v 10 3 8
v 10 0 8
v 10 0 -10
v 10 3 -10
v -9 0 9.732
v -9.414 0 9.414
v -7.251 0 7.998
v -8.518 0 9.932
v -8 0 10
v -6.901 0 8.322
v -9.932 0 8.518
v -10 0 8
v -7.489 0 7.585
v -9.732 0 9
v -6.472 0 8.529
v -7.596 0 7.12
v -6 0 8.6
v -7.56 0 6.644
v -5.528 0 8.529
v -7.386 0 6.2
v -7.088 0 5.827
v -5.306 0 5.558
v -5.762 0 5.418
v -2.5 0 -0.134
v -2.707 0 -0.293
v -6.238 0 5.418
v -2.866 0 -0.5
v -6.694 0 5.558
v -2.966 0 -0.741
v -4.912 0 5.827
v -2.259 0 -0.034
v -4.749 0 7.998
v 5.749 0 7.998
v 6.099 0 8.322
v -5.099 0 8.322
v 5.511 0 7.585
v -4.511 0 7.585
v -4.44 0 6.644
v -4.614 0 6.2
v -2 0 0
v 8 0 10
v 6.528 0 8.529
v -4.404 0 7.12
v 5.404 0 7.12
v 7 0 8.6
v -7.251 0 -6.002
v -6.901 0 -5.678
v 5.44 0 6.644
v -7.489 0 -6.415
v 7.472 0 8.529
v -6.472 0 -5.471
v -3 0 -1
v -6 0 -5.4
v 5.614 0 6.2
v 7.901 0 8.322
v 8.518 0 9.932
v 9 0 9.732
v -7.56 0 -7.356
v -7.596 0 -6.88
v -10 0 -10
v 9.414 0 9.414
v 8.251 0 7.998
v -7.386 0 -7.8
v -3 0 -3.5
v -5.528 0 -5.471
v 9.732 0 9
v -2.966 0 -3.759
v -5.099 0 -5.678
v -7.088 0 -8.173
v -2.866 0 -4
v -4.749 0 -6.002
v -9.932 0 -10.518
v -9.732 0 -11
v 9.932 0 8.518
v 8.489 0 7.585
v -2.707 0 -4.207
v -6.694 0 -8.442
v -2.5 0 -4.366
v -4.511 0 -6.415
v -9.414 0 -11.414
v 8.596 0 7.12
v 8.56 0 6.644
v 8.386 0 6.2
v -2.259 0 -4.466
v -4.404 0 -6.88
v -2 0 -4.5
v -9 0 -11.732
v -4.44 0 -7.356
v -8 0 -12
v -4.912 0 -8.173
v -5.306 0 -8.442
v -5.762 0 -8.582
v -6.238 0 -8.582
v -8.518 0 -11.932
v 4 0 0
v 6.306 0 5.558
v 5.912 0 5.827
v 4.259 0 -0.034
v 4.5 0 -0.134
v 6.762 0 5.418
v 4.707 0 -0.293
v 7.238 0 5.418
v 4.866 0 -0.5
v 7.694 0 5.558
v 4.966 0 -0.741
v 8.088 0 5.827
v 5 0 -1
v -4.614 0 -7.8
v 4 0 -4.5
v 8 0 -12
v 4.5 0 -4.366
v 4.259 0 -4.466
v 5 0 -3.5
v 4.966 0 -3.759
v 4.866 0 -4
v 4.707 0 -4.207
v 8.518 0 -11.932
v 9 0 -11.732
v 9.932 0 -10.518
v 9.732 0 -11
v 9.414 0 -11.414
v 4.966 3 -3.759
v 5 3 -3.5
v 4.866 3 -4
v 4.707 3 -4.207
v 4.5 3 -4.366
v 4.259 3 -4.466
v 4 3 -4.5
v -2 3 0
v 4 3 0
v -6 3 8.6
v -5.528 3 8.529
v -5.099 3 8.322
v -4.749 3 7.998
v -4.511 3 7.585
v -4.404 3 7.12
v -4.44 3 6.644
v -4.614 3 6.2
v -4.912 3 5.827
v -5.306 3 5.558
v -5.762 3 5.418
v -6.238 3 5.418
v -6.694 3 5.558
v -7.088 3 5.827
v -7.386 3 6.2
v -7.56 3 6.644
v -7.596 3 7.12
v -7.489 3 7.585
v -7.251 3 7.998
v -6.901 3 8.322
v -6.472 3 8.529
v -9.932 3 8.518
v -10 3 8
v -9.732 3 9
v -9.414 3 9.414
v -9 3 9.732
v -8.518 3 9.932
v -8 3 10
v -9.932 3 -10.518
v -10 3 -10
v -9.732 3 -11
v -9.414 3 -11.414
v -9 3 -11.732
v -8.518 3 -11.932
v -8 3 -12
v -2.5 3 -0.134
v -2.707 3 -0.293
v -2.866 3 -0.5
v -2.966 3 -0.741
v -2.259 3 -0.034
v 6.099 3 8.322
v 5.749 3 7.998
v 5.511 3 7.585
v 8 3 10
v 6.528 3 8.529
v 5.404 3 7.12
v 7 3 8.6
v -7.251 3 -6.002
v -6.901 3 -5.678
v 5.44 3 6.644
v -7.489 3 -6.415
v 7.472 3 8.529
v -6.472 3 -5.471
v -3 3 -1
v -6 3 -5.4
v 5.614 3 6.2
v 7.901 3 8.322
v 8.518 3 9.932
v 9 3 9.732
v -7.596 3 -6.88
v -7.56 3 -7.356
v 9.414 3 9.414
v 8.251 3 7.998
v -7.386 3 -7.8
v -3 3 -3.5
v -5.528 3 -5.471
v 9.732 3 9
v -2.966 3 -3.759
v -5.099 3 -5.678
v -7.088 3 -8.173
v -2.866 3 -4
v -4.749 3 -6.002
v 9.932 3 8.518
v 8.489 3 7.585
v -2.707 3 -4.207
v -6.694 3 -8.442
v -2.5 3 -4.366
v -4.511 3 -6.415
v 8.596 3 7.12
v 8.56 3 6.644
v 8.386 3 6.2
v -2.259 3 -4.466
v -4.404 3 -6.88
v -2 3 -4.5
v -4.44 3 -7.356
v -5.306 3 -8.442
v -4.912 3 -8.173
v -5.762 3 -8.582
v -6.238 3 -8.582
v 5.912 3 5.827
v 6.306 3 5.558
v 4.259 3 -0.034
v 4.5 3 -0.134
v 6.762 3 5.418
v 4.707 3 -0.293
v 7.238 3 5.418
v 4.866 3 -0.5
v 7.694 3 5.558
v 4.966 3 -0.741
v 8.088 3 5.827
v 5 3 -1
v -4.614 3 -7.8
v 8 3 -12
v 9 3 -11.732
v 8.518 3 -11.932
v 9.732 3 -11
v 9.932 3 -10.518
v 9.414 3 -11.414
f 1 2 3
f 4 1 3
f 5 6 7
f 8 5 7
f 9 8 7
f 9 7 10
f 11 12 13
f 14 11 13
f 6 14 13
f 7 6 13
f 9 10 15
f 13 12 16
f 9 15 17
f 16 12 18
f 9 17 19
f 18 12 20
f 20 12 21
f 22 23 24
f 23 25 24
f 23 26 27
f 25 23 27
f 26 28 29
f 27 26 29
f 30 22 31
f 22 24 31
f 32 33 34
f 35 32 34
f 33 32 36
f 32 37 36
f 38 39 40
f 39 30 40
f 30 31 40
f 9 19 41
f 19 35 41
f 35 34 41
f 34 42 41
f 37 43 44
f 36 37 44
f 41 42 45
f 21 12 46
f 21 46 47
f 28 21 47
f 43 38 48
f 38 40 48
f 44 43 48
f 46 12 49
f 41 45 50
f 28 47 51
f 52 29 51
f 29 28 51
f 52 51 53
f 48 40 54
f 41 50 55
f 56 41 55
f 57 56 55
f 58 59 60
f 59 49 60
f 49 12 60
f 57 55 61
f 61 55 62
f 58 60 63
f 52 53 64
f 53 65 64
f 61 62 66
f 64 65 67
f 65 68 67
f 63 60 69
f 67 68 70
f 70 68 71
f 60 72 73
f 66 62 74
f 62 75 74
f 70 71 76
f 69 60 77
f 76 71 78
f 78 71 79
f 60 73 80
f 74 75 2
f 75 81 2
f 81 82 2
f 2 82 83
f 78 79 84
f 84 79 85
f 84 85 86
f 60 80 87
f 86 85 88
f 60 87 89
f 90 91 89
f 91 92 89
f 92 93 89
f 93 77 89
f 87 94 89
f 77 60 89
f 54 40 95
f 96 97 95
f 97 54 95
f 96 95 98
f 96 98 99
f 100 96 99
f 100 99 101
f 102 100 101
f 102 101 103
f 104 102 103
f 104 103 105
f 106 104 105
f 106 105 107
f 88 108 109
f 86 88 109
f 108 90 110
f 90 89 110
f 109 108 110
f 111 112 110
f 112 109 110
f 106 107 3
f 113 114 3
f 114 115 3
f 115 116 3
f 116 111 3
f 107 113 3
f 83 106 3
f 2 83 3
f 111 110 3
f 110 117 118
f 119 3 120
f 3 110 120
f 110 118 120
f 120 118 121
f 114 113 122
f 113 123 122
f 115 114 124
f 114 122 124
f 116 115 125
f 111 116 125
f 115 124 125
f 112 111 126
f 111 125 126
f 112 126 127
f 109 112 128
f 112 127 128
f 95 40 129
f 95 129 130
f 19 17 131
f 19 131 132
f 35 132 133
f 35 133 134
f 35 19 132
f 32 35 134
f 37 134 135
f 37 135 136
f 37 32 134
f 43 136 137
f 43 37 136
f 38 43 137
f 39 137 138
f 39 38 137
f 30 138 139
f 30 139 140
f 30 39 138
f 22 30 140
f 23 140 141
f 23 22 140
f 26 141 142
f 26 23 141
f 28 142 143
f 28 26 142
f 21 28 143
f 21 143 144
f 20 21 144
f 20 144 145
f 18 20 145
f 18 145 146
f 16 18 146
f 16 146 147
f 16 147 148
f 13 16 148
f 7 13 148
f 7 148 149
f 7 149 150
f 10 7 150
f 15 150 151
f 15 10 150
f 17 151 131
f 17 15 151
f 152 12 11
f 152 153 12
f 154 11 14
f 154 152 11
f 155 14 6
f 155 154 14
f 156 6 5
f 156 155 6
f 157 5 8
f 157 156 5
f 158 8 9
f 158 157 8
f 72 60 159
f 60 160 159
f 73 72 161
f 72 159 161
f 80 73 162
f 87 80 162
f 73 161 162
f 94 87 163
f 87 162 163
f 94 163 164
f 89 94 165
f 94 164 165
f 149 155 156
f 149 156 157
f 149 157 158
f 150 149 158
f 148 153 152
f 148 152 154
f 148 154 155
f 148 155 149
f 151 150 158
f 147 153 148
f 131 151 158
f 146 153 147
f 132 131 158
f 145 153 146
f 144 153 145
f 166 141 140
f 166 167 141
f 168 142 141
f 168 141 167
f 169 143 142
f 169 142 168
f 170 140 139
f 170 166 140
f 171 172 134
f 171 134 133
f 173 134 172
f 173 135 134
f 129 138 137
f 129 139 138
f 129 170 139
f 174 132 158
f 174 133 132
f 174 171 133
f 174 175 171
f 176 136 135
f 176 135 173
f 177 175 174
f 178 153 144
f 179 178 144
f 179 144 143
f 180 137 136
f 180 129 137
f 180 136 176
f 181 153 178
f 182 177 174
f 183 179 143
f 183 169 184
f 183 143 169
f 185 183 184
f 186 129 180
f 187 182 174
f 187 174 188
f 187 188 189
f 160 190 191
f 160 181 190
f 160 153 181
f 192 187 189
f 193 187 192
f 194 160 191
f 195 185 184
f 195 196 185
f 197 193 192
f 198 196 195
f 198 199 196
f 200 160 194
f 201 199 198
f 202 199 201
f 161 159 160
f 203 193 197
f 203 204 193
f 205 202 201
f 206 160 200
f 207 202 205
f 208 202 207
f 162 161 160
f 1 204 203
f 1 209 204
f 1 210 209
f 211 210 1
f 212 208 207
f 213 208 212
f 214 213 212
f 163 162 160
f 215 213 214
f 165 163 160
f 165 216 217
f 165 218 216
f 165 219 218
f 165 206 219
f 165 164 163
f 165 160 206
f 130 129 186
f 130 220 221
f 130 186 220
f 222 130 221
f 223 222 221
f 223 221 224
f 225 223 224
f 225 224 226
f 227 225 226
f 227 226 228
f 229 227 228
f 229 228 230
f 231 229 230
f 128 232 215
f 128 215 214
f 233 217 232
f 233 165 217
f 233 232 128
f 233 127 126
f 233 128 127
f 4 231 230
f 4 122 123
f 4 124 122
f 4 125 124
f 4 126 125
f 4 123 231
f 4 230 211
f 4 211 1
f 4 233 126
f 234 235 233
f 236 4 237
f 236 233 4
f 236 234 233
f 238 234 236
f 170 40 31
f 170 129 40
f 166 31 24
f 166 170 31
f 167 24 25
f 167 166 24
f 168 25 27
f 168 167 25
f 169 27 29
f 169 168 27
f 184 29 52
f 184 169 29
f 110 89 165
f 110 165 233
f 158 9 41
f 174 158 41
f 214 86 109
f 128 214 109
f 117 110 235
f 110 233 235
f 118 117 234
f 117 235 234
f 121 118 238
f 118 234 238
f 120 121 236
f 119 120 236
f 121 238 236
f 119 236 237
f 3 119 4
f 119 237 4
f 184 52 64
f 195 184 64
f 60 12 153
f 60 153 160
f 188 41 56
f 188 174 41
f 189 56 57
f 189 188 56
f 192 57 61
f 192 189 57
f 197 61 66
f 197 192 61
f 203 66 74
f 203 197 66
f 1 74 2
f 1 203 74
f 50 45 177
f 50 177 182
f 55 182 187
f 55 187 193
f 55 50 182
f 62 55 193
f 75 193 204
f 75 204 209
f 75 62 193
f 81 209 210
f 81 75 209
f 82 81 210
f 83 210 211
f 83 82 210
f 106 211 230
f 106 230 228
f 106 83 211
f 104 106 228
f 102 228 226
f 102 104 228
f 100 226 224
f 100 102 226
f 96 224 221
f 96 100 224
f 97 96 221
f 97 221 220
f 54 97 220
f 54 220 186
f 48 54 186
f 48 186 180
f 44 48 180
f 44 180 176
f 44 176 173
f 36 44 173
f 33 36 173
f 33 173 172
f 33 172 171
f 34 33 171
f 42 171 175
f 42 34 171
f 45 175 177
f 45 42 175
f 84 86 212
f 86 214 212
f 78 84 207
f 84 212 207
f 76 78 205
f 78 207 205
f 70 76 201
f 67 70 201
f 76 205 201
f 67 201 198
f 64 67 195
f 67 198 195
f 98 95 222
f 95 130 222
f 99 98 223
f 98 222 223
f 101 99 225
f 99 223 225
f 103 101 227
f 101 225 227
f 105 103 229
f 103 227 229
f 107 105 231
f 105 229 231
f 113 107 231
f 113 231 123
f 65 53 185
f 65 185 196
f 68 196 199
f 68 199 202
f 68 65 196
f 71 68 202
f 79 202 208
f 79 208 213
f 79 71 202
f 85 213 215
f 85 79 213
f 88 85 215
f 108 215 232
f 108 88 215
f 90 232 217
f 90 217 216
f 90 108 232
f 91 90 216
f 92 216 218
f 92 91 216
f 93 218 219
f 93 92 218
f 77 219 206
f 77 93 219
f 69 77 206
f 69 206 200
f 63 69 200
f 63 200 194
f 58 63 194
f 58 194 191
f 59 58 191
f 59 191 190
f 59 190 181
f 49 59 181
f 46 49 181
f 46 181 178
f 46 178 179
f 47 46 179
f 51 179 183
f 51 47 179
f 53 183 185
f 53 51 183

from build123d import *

# Parameters (mm, degrees)
SKETCH_2_W      = 20
SKETCH_2_H      = 22
SKETCH_2_R      = 1.6
SKETCH_2_W_2    = 8
SKETCH_2_H_2    = 4.5
EXTRUDE_1_DEPTH = 3
FILLET_1_R      = 2
FILLET_2_R      = 1


with BuildPart() as part:
    # 草图2 → 凸台-拉伸1 (new body)
    with BuildSketch(Plane(origin=(0, 0, 0), x_dir=(1, 0, 0), z_dir=(0, 1, 0))):
        with Locations((0, 1)):
            Rectangle(SKETCH_2_W, SKETCH_2_H)
        with Locations(Location((-6, -7, 0), (0, 0, 270))):
            Circle(SKETCH_2_R, mode=Mode.SUBTRACT)
        with Locations(Location((7, -7, 0), (0, 0, 270))):
            Circle(SKETCH_2_R, mode=Mode.SUBTRACT)
        with Locations(Location((-6, 7, 0), (0, 0, 270))):
            Circle(SKETCH_2_R, mode=Mode.SUBTRACT)
        with Locations((1, 2.25)):
            Rectangle(SKETCH_2_W_2, SKETCH_2_H_2, mode=Mode.SUBTRACT)
    extrude(amount=EXTRUDE_1_DEPTH)

    # 圆角1
    fillet_1_edges = [part.edges().sort_by_distance(p)[0] for p in [
        (10, 1.5, 10),
        (-10, 1.5, 10),
        (-10, 1.5, -12),
        (10, 1.5, -12),
    ]]
    fillet(fillet_1_edges, radius=FILLET_1_R)

    # 圆角2
    fillet_2_edges = [part.edges().sort_by_distance(p)[0] for p in [
        (5, 1.5, -4.5),
        (-3, 1.5, -4.5),
        (-3, 1.5, 0),
        (5, 1.5, 0),
    ]]
    fillet(fillet_2_edges, radius=FILLET_2_R)


solid = part.part
